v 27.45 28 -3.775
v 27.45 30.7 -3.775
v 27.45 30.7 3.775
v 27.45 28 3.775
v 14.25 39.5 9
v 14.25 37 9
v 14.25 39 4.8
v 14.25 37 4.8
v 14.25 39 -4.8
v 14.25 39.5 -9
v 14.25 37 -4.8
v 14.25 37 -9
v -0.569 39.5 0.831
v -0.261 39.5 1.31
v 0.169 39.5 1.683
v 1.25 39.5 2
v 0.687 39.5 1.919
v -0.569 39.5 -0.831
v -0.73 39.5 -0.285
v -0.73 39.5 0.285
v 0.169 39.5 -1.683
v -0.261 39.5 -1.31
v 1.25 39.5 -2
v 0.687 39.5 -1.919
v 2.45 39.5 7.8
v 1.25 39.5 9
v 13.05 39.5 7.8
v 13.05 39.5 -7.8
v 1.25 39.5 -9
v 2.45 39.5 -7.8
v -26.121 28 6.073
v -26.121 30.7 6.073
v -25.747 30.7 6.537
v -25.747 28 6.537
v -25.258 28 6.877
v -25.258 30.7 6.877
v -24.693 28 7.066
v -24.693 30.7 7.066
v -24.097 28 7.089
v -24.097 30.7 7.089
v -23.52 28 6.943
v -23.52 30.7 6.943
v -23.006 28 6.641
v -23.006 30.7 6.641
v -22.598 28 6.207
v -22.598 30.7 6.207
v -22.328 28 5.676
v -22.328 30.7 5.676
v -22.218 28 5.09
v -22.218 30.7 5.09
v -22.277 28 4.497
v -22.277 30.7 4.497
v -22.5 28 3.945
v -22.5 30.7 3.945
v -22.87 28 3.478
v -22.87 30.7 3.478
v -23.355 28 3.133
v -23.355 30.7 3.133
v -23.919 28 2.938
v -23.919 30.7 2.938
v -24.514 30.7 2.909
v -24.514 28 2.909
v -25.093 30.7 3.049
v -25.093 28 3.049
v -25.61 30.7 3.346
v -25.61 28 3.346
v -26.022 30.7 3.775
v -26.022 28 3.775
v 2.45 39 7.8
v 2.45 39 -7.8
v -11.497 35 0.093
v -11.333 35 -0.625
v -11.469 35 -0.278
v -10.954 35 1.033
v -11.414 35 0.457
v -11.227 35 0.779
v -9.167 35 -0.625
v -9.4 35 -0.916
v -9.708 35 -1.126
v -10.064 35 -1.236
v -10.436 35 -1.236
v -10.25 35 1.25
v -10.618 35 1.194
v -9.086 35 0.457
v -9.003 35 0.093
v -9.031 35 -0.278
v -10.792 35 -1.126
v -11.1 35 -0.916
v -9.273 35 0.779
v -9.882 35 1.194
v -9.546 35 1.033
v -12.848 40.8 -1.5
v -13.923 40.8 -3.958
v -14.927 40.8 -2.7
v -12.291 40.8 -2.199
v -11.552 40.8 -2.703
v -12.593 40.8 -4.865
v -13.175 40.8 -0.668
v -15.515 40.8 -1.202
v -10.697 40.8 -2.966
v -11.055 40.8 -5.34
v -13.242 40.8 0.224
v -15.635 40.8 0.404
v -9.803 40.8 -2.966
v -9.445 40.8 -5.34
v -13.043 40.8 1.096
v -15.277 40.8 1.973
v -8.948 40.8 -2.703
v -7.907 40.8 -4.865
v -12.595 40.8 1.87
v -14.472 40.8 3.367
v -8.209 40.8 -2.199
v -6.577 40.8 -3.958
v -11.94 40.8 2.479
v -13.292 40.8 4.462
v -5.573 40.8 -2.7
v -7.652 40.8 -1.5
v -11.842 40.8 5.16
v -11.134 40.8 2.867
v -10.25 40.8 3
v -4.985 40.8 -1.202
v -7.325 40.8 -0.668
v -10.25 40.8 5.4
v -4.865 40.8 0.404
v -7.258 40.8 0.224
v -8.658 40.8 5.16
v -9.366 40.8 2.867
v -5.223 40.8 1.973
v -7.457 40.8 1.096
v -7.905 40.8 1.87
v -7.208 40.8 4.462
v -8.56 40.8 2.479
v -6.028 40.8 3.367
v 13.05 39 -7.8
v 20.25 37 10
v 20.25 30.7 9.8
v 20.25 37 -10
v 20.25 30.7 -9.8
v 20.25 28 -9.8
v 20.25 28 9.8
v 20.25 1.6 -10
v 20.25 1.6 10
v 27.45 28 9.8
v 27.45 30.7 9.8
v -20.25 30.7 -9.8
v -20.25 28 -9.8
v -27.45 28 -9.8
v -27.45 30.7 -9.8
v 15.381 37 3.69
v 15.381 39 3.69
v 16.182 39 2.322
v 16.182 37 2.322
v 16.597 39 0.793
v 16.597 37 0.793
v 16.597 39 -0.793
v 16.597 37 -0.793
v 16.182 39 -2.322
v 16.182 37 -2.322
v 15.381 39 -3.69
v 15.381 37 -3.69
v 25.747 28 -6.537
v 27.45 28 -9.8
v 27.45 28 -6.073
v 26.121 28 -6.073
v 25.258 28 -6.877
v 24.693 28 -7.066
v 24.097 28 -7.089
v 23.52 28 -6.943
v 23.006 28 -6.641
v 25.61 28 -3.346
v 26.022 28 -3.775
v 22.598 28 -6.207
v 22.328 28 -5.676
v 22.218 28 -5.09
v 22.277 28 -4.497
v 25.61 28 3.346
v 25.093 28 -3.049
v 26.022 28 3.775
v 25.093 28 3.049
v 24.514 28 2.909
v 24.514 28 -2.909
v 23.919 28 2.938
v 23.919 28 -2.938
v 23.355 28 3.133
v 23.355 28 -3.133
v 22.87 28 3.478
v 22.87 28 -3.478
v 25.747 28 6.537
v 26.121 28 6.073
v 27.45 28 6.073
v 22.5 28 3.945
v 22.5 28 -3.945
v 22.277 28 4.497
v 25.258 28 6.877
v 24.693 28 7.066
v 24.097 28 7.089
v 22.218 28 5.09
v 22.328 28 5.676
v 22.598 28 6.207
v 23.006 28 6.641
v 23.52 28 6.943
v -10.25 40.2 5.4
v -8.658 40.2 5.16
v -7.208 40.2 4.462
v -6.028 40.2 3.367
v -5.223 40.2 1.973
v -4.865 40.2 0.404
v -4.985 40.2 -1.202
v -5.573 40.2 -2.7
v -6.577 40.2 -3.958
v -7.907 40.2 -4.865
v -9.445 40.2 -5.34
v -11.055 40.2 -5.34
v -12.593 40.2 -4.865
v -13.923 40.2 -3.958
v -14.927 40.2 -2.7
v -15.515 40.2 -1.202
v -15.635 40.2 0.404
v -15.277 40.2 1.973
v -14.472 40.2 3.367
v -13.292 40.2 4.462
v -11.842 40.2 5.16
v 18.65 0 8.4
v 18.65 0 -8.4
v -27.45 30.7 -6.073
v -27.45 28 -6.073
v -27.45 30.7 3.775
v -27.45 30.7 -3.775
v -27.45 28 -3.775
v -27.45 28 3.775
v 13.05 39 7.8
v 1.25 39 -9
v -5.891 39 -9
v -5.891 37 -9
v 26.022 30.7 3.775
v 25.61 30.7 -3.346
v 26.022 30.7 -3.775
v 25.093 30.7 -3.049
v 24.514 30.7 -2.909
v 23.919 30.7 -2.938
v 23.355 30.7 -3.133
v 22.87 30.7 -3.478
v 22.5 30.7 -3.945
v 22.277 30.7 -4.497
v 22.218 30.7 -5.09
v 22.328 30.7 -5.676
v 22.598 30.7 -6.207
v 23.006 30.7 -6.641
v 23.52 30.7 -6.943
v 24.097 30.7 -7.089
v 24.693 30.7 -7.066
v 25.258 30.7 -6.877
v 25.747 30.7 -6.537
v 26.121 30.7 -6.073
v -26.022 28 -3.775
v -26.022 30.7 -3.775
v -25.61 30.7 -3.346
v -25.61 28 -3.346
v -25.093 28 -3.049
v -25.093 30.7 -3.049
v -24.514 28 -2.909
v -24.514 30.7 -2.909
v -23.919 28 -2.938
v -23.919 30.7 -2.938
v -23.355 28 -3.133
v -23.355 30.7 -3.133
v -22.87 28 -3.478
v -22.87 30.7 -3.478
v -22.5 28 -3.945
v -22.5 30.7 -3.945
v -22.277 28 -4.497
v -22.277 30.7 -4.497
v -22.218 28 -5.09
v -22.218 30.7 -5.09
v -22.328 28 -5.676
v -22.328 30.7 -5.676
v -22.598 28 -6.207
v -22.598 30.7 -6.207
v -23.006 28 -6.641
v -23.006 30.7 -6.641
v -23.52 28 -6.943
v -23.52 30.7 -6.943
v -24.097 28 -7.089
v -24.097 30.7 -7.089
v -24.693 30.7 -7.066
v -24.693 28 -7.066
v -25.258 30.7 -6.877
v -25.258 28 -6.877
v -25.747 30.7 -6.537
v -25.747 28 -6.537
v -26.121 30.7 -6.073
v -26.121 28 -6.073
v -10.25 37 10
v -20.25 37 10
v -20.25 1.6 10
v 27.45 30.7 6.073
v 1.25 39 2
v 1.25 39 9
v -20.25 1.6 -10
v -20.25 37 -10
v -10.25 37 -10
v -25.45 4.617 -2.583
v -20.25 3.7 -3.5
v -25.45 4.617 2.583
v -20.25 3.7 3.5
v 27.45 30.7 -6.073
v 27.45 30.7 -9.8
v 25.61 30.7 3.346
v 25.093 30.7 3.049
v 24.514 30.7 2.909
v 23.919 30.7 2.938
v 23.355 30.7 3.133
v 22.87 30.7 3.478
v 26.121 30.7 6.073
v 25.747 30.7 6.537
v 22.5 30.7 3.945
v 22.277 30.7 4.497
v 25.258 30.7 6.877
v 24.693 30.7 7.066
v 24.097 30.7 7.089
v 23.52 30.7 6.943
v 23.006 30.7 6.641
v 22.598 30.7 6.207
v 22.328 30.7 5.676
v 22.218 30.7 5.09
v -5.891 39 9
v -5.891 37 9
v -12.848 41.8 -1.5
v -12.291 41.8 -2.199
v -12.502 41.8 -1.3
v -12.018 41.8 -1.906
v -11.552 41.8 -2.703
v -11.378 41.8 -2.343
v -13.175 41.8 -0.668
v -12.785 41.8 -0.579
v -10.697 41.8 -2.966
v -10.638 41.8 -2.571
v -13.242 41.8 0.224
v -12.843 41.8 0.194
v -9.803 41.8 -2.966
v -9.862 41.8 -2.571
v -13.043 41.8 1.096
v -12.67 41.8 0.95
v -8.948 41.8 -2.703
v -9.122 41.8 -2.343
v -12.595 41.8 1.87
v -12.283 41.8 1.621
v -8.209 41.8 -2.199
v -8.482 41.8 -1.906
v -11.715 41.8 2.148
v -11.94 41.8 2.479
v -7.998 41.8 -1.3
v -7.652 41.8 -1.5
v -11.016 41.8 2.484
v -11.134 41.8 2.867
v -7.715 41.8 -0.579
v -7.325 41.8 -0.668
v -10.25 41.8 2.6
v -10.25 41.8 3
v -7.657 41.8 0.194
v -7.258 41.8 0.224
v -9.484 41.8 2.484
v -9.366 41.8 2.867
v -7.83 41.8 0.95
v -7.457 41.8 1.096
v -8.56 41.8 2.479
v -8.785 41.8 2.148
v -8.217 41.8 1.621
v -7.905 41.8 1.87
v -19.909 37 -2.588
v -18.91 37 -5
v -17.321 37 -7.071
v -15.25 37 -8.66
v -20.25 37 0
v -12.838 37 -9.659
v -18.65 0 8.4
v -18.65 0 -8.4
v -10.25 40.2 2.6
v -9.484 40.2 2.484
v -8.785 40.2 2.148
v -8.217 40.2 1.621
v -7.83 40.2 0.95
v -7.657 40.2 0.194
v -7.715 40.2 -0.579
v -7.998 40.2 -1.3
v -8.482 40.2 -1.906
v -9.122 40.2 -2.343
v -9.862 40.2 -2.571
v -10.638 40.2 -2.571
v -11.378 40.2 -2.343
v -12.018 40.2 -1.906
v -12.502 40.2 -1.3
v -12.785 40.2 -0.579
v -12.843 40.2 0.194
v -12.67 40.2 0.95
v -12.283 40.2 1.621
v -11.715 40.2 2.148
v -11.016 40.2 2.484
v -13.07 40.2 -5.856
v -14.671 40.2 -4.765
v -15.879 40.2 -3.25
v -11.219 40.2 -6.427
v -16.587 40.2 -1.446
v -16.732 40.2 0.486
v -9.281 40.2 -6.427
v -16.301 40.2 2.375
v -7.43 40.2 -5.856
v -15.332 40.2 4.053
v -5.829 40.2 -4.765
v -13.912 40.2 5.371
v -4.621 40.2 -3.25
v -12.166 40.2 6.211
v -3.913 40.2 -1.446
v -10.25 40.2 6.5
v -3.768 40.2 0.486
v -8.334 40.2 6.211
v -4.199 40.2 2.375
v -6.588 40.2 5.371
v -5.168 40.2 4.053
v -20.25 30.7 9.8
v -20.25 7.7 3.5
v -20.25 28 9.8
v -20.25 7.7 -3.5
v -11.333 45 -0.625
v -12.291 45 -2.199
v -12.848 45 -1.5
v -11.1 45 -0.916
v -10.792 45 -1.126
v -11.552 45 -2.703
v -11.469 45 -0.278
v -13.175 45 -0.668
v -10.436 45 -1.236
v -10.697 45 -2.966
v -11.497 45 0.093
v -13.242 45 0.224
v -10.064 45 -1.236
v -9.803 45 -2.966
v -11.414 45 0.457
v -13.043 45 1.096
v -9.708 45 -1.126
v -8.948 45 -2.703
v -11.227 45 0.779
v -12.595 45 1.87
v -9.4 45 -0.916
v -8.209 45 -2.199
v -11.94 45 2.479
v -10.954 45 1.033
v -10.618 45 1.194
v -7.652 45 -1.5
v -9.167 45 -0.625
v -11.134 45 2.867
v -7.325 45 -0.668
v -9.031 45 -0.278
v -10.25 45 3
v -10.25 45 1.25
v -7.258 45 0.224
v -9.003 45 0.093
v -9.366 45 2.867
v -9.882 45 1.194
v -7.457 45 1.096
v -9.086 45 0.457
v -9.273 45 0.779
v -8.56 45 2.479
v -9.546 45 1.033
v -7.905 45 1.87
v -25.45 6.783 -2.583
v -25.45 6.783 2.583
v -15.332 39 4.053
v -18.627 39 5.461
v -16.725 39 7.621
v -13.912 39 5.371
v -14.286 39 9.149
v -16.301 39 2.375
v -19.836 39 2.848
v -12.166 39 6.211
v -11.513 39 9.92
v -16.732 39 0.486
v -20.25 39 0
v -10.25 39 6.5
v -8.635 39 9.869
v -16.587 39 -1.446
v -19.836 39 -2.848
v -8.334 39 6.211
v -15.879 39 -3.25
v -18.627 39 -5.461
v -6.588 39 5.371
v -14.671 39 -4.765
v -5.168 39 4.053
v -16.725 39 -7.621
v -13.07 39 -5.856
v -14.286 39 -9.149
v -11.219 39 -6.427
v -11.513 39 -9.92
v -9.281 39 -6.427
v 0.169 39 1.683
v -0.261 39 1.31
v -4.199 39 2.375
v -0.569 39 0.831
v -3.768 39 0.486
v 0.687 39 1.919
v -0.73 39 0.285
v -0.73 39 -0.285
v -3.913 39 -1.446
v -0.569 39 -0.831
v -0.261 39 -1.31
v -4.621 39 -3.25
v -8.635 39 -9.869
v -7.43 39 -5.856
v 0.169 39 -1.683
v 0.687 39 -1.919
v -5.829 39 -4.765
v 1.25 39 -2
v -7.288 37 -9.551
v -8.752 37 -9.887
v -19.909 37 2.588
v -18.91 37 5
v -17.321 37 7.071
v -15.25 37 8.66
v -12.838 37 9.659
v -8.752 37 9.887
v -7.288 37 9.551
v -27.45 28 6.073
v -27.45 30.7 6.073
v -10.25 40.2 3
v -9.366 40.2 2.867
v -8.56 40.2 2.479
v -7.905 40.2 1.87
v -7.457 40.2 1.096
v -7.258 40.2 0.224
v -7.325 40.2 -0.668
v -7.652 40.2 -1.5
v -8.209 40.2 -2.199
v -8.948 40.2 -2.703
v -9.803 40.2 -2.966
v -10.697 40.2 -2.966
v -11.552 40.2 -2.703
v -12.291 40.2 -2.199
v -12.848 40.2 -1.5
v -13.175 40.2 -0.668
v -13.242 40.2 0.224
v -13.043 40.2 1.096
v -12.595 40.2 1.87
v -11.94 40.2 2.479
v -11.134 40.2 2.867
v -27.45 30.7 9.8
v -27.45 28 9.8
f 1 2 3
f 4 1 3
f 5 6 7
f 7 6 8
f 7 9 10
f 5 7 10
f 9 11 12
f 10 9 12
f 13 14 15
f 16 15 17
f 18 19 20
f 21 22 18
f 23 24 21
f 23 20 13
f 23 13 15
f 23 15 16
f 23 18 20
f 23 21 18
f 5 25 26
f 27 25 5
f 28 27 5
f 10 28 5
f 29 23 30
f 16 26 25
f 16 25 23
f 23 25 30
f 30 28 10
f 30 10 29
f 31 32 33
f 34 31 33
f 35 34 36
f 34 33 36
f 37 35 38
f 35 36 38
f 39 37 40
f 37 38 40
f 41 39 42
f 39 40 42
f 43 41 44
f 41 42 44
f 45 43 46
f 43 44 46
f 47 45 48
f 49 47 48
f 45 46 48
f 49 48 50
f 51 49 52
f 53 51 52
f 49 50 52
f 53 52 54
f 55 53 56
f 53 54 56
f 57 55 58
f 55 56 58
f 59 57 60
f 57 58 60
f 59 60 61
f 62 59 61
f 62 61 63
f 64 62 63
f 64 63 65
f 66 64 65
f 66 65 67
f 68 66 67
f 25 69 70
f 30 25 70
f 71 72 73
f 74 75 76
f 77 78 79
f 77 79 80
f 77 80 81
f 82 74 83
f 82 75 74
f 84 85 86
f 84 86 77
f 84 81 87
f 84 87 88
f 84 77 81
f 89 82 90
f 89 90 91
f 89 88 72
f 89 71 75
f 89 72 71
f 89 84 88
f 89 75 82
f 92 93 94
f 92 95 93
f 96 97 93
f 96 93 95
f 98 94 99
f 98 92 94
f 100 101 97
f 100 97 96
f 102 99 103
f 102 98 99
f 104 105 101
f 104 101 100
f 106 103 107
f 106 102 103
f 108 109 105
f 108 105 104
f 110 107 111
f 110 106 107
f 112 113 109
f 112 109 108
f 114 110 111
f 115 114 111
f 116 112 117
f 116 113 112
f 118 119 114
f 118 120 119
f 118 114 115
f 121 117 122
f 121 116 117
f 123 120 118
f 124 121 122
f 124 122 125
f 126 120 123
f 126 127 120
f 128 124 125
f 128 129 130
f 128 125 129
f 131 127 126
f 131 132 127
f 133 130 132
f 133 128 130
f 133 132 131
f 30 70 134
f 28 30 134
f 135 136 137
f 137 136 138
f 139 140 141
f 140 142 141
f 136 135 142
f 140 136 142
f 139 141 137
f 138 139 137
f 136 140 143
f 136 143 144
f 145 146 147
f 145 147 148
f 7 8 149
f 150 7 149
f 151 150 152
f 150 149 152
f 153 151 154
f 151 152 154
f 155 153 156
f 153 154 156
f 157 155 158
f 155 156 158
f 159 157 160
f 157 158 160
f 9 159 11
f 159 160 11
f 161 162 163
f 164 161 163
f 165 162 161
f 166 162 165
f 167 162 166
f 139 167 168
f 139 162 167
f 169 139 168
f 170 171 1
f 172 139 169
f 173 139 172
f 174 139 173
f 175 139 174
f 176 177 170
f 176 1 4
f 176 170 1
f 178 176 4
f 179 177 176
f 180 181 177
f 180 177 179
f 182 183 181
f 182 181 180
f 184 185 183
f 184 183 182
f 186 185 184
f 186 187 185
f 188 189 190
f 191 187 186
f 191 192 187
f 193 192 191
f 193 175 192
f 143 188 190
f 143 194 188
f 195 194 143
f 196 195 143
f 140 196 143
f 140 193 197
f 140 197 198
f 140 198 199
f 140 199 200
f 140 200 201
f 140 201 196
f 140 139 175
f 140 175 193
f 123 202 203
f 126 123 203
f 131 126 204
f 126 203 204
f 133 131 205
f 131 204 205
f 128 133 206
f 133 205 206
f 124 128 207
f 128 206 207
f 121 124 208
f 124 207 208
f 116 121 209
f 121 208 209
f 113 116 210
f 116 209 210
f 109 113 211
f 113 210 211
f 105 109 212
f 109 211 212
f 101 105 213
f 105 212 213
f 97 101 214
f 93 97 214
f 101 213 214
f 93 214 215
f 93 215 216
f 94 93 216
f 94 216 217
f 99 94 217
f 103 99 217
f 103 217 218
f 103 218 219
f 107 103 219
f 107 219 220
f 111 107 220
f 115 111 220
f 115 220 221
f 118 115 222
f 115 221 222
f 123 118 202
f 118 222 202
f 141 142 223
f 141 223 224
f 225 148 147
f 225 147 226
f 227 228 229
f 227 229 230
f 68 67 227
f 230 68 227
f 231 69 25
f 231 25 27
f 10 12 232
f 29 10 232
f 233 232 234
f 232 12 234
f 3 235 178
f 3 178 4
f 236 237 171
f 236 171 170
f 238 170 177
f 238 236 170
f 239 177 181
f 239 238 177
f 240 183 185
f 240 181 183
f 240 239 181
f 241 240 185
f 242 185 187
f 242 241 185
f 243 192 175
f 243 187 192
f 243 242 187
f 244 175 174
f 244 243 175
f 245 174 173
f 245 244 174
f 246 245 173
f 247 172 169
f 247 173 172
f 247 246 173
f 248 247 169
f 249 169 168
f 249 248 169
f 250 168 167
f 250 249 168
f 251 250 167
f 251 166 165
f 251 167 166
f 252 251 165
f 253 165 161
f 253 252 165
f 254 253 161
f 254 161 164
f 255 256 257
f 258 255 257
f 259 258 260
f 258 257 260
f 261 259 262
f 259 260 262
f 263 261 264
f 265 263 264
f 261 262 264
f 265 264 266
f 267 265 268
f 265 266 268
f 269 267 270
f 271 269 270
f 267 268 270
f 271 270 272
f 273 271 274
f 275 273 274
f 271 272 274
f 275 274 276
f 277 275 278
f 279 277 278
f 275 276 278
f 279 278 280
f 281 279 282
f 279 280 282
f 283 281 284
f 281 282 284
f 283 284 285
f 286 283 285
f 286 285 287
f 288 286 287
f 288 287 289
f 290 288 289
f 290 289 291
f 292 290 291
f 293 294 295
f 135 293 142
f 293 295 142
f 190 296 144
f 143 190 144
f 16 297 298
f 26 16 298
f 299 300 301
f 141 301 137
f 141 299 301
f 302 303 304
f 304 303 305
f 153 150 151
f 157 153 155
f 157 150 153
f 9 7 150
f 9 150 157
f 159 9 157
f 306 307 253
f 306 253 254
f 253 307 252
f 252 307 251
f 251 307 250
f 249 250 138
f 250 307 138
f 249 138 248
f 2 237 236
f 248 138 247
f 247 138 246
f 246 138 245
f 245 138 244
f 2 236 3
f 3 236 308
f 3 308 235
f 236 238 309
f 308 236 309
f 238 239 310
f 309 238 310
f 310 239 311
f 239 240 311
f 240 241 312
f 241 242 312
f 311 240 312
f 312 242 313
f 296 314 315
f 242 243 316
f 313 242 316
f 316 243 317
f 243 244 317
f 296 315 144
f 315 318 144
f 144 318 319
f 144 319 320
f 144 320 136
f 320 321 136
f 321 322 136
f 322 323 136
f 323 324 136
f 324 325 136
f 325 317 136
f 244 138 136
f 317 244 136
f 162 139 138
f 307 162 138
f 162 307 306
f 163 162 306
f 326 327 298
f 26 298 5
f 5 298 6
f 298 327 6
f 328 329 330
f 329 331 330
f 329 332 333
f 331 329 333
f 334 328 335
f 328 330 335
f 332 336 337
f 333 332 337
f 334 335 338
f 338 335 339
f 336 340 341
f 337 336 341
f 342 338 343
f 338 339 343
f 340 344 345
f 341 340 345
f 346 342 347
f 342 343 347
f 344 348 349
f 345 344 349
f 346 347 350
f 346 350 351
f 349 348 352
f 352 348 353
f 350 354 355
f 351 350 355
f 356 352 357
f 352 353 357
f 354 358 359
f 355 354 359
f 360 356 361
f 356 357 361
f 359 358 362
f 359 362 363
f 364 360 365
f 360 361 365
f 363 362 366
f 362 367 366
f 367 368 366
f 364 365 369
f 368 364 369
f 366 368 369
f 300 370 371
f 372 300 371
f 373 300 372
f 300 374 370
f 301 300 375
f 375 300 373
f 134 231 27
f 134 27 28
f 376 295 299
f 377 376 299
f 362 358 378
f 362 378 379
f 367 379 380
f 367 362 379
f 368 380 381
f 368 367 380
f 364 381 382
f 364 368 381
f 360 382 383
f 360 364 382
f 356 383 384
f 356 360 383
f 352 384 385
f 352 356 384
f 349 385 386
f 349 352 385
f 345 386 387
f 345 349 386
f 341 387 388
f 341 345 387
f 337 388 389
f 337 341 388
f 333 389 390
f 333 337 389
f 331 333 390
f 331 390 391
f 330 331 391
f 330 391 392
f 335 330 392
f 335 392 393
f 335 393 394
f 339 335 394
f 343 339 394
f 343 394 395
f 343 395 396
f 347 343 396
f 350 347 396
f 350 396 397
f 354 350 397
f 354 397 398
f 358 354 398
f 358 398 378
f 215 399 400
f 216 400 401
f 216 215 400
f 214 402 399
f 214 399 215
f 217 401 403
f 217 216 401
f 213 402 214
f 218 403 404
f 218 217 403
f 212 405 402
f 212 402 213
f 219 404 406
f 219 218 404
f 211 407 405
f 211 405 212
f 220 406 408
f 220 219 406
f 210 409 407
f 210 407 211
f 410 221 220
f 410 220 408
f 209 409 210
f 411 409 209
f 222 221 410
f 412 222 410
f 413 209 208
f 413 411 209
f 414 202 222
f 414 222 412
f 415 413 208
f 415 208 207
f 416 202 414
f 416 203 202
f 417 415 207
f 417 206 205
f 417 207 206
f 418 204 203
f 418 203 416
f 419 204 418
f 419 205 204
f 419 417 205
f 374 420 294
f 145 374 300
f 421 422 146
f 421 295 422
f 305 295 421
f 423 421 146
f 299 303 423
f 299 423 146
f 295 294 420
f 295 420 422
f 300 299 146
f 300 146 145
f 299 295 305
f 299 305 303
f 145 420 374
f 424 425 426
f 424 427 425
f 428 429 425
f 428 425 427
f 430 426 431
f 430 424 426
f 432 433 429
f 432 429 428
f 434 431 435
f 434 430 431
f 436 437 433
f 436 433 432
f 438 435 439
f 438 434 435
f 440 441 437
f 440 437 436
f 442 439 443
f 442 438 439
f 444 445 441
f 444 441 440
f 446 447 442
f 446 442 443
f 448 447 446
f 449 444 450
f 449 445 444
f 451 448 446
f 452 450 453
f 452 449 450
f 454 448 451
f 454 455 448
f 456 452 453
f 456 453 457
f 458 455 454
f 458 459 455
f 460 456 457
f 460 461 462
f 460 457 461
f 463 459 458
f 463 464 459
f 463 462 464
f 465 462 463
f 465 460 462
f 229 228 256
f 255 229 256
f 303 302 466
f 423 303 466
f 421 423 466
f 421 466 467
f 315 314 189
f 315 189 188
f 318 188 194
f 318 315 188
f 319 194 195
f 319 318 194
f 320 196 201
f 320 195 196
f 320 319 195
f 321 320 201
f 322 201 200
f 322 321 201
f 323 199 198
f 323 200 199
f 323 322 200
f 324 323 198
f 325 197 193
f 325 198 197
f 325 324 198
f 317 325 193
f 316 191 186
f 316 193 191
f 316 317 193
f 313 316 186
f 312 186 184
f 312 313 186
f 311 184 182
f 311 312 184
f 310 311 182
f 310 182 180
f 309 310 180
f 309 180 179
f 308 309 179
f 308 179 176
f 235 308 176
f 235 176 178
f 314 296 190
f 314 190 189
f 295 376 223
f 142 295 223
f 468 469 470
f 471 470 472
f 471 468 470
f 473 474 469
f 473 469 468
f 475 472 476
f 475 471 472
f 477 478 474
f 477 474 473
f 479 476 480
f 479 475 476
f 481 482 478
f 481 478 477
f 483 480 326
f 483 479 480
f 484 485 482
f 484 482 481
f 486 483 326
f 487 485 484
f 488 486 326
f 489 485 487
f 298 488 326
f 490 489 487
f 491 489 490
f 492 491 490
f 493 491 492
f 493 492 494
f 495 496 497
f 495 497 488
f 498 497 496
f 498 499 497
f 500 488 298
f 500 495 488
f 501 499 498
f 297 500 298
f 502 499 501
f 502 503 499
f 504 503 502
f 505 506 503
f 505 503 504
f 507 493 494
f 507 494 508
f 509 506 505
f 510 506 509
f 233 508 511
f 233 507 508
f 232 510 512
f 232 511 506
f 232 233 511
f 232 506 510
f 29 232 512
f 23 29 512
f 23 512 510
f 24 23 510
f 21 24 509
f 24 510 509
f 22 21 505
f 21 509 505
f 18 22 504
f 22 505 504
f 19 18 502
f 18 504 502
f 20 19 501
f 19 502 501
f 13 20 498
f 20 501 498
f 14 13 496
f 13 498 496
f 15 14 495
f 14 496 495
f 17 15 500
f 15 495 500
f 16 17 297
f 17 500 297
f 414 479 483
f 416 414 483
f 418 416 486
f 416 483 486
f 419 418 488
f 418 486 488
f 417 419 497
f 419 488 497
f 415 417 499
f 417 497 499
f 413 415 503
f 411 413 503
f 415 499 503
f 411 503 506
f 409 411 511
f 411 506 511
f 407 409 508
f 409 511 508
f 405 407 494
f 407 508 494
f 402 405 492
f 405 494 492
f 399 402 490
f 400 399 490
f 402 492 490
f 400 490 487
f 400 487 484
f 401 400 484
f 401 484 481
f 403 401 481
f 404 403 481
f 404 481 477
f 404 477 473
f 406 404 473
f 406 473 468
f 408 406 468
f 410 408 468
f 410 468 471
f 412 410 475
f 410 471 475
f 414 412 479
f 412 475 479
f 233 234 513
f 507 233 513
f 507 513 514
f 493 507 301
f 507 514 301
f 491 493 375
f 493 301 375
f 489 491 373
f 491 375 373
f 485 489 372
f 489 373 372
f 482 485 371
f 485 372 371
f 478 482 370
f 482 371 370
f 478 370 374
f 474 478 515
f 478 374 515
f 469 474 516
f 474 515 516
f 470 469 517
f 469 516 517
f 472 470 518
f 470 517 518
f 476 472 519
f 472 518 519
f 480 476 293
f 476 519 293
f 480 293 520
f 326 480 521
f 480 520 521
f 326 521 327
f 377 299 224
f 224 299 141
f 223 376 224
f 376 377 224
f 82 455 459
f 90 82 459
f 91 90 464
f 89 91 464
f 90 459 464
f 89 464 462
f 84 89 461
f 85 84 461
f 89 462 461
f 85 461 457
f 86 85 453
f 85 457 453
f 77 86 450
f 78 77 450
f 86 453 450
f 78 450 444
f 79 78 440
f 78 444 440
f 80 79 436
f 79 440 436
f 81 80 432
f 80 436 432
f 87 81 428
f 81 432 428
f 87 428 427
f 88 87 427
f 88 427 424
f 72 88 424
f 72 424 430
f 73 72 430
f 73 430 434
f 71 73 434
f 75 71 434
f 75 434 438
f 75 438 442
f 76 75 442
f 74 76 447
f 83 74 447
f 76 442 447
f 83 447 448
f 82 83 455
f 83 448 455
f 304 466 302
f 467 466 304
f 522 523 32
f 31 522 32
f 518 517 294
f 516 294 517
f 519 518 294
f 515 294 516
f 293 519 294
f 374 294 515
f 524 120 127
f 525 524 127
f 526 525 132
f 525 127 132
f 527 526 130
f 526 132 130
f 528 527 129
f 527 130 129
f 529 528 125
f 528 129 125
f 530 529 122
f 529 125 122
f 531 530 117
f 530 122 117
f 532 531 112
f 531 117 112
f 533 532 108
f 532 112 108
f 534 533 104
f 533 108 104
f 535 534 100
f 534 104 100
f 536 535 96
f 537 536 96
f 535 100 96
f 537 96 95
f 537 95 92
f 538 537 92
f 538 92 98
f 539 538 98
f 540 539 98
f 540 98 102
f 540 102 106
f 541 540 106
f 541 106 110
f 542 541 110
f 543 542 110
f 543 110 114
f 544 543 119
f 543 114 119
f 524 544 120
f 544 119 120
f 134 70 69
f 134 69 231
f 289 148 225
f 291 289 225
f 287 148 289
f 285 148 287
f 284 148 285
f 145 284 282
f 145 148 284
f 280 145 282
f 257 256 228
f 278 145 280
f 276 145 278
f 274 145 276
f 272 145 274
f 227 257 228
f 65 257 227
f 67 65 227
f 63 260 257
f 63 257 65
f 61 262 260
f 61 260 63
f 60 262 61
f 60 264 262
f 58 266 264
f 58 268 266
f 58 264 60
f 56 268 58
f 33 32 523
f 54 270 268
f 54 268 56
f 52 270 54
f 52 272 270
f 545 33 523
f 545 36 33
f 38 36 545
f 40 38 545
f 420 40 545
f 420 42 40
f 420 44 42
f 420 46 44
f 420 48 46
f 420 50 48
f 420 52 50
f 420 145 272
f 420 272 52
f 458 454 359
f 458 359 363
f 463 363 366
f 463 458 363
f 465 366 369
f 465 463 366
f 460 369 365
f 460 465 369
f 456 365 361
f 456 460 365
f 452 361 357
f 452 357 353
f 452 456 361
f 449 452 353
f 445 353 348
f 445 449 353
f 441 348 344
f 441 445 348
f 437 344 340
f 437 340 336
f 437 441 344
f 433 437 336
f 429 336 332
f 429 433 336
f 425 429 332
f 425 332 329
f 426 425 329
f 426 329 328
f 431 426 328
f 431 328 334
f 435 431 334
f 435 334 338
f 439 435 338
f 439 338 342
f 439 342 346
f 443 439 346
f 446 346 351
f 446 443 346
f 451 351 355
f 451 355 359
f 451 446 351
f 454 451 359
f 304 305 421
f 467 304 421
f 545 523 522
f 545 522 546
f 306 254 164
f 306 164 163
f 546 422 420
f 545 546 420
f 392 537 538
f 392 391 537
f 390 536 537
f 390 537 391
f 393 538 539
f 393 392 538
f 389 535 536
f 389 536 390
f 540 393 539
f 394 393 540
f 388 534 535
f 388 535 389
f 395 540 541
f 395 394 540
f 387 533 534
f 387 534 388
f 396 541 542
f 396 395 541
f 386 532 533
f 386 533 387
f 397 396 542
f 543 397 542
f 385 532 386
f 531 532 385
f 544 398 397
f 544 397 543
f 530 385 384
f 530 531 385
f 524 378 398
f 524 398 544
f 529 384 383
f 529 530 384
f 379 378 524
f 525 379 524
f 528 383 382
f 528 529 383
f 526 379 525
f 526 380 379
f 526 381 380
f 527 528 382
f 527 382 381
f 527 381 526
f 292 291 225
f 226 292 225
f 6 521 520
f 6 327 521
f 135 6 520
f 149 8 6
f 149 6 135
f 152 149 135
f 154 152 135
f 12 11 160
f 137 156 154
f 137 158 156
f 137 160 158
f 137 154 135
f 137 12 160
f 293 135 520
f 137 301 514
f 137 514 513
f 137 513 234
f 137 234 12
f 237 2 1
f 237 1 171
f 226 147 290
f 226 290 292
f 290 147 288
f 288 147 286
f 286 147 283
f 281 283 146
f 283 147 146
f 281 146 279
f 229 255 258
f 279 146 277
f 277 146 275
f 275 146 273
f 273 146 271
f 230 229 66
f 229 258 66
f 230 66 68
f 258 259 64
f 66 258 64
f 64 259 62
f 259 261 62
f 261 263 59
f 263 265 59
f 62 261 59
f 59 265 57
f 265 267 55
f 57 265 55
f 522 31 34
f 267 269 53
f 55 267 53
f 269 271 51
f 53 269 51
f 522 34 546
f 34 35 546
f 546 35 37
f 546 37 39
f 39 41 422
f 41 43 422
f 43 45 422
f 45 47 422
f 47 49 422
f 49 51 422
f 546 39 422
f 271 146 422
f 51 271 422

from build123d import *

# Parameters (mm, degrees)
SKETCH1_W           = 40.5
SKETCH1_H           = 20
BOSS_EXTRUDE1_DEPTH = 37
SKETCH2_W           = 19.6
SKETCH2_H           = 2.7
BOSS_EXTRUDE2_DEPTH = 7.2
CUT_EXTRUDE1_DEPTH  = 43.379151714
BOSS_EXTRUDE3_DEPTH = 2
SKETCH6_R           = 6.5
BOSS_EXTRUDE4_DEPTH = 1.2
SKETCH7_R           = 5.4
BOSS_EXTRUDE5_DEPTH = 0.6
SKETCH8_R           = 3
SKETCH8_R_2         = 2.6
CUT_EXTRUDE2_DEPTH  = 0.6
BOSS_EXTRUDE6_START = 1
SKETCH9_R           = 2.6
BOSS_EXTRUDE6_DEPTH = 1
BOSS_EXTRUDE7_START = 3.2
SKETCH10_R          = 3
BOSS_EXTRUDE7_DEPTH = 3.2
SKETCH11_R          = 1.25
CUT_EXTRUDE3_DEPTH  = 10
SKETCH12_W          = 10.6
SKETCH12_H          = 15.6
BOSS_EXTRUDE8_DEPTH = 0.5
CHAMFER1_SIZE       = 1.6
SKETCH13_W          = 7
SKETCH13_H          = 4
BOSS_EXTRUDE9_DEPTH = 5.2
DRAFT1_ANGLE        = 10


with BuildPart() as part:
    # Sketch1 → Boss-Extrude1 (new body)
    with BuildSketch(Plane(origin=(0, 0, 0), x_dir=(1, 0, 0), z_dir=(0, 1, 0))):
        Rectangle(SKETCH1_W, SKETCH1_H)
    extrude(amount=BOSS_EXTRUDE1_DEPTH)

    # Sketch2 → Boss-Extrude2 (add)
    with BuildSketch(Plane.ZY.offset(20.25)):
        with Locations((0, 29.35)):
            Rectangle(SKETCH2_W, SKETCH2_H)
    boss_extrude2 = extrude(amount=BOSS_EXTRUDE2_DEPTH)

    # Sketch3 → Cut-Extrude1 (cut, through all)
    with BuildSketch(Plane(origin=(0, 30.7, 0), x_dir=(1, 0, 0), z_dir=(0, 1, 0))):
        with BuildLine():
            Line((-27.45, -3.775463215), (-27.45, -6.073333333))
            Line((-27.45, -6.073333333), (-26.121072803, -6.073333333))
            ThreePointArc((-26.121072803, -6.073333333), (-22.218036714, -5.090354029), (-26.022113628, -3.775463215))
            Line((-26.022113628, -3.775463215), (-27.45, -3.775463215))
        make_face()
        with BuildLine():
            Line((-26.121072803, 6.073333333), (-27.45, 6.073333333))
            Line((-27.45, 6.073333333), (-27.45, 3.775463215))
            Line((-27.45, 3.775463215), (-26.022113628, 3.775463215))
            ThreePointArc((-26.022113628, 3.775463215), (-22.218036714, 5.090354029), (-26.121072803, 6.073333333))
        make_face()
    cut_extrude1 = extrude(amount=-CUT_EXTRUDE1_DEPTH, mode=Mode.SUBTRACT)

    # Mirror2: Boss-Extrude2, Cut-Extrude1 across plane
    add(boss_extrude2.mirror(Plane(origin=(0, 0, 0), x_dir=(0, 0, 1), z_dir=(1, 0, 0))))
    add(cut_extrude1.mirror(Plane(origin=(0, 0, 0), x_dir=(0, 0, 1), z_dir=(1, 0, 0))), mode=Mode.SUBTRACT)

    # Sketch5 → Boss-Extrude3 (add)
    with BuildSketch(Plane(origin=(0, 37, 0), x_dir=(1, 0, 0), z_dir=(0, 1, 0))):
        with BuildLine():
            Line((-5.891101056, -9), (14.25, -9))
            Line((14.25, -9), (14.25, -4.8))
            ThreePointArc((14.25, -4.8), (16.65, 0), (14.25, 4.8))
            Line((14.25, 4.8), (14.25, 9))
            Line((14.25, 9), (-5.891101056, 9))
            ThreePointArc((-5.891101056, 9), (-20.25, 0), (-5.891101056, -9))
        make_face()
    extrude(amount=BOSS_EXTRUDE3_DEPTH)

    # Sketch6 → Boss-Extrude4 (add)
    with BuildSketch(Plane(origin=(0, 39, 0), x_dir=(1, 0, 0), z_dir=(0, 1, 0))):
        with Locations(Location((-10.25, 0, 0), (0, 0, 270))):
            Circle(SKETCH6_R)
    extrude(amount=BOSS_EXTRUDE4_DEPTH)

    # Sketch7 → Boss-Extrude5 (add)
    with BuildSketch(Plane(origin=(0, 40.2, 0), x_dir=(1, 0, 0), z_dir=(0, 1, 0))):
        with Locations(Location((-10.25, 0, 0), (0, 0, 270))):
            Circle(SKETCH7_R)
    extrude(amount=BOSS_EXTRUDE5_DEPTH)

    # Sketch8 → Cut-Extrude2 (cut)
    with BuildSketch(Plane(origin=(0, 40.8, 0), x_dir=(1, 0, 0), z_dir=(0, 1, 0))):
        with Locations(Location((-10.25, 0, 0), (0, 0, 270))):
            Circle(SKETCH8_R)
        with Locations(Location((-10.25, 0, 0), (0, 0, 270))):
            Circle(SKETCH8_R_2, mode=Mode.SUBTRACT)
    extrude(amount=-CUT_EXTRUDE2_DEPTH, mode=Mode.SUBTRACT)

    # Sketch9 → Boss-Extrude6 (add)
    with BuildSketch(Plane(origin=(0, 40.8, 0), x_dir=(1, 0, 0), z_dir=(0, 1, 0)).offset(BOSS_EXTRUDE6_START)):
        with Locations(Location((-10.25, 0, 0), (0, 0, 270))):
            Circle(SKETCH9_R)
    extrude(amount=-BOSS_EXTRUDE6_DEPTH)

    # Sketch10 → Boss-Extrude7 (add)
    with BuildSketch(Plane(origin=(0, 41.8, 0), x_dir=(1, 0, 0), z_dir=(0, 1, 0)).offset(BOSS_EXTRUDE7_START)):
        with Locations(Location((-10.25, 0, 0), (0, 0, 270))):
            Circle(SKETCH10_R)
    extrude(amount=-BOSS_EXTRUDE7_DEPTH)

    # Sketch11 → Cut-Extrude3 (cut)
    with BuildSketch(Plane(origin=(0, 45, 0), x_dir=(1, 0, 0), z_dir=(0, 1, 0))):
        with Locations(Location((-10.25, 0, 0), (0, 0, 270))):
            Circle(SKETCH11_R)
    extrude(amount=-CUT_EXTRUDE3_DEPTH, mode=Mode.SUBTRACT)

    # Sketch12 → Boss-Extrude8 (add)
    with BuildSketch(Plane(origin=(0, 39, 0), x_dir=(1, 0, 0), z_dir=(0, 1, 0))):
        with BuildLine():
            Line((14.25, 9), (1.25, 9))
            Line((1.25, 9), (1.25, 2))
            ThreePointArc((1.25, 2), (-0.75, 0), (1.25, -2))
            Line((1.25, -2), (1.25, -9))
            Line((1.25, -9), (14.25, -9))
            Line((14.25, -9), (14.25, 9))
        make_face()
        with Locations((7.75, 0)):
            Rectangle(SKETCH12_W, SKETCH12_H, mode=Mode.SUBTRACT)
    extrude(amount=BOSS_EXTRUDE8_DEPTH)

    # Chamfer1
    chamfer1_edges = [part.edges().sort_by_distance(p)[0] for p in [
        (0, 0, 10),
        (20.25, 0, 0),
        (0, 0, -10),
        (-20.25, 0, 0),
    ]]
    chamfer(chamfer1_edges, length=CHAMFER1_SIZE)

    # Sketch13 → Boss-Extrude9 (add)
    with BuildSketch(Plane.ZY.offset(20.25)):
        with Locations((0, 5.7)):
            Rectangle(SKETCH13_W, SKETCH13_H)
    extrude(amount=BOSS_EXTRUDE9_DEPTH)

    # Draft1
    draft1_faces = [part.faces().sort_by_distance(p)[0] for p in [
        (-22.85, 7.7, 0),
        (-22.85, 5.7, 3.5),
        (-22.85, 5.7, -3.5),
        (-22.85, 3.7, 0),
    ]]
    draft(draft1_faces, Plane(origin=(-20.25, 37, 10), x_dir=(0, 0, -1), z_dir=(-1, 0, 0)), DRAFT1_ANGLE)


solid = part.part
